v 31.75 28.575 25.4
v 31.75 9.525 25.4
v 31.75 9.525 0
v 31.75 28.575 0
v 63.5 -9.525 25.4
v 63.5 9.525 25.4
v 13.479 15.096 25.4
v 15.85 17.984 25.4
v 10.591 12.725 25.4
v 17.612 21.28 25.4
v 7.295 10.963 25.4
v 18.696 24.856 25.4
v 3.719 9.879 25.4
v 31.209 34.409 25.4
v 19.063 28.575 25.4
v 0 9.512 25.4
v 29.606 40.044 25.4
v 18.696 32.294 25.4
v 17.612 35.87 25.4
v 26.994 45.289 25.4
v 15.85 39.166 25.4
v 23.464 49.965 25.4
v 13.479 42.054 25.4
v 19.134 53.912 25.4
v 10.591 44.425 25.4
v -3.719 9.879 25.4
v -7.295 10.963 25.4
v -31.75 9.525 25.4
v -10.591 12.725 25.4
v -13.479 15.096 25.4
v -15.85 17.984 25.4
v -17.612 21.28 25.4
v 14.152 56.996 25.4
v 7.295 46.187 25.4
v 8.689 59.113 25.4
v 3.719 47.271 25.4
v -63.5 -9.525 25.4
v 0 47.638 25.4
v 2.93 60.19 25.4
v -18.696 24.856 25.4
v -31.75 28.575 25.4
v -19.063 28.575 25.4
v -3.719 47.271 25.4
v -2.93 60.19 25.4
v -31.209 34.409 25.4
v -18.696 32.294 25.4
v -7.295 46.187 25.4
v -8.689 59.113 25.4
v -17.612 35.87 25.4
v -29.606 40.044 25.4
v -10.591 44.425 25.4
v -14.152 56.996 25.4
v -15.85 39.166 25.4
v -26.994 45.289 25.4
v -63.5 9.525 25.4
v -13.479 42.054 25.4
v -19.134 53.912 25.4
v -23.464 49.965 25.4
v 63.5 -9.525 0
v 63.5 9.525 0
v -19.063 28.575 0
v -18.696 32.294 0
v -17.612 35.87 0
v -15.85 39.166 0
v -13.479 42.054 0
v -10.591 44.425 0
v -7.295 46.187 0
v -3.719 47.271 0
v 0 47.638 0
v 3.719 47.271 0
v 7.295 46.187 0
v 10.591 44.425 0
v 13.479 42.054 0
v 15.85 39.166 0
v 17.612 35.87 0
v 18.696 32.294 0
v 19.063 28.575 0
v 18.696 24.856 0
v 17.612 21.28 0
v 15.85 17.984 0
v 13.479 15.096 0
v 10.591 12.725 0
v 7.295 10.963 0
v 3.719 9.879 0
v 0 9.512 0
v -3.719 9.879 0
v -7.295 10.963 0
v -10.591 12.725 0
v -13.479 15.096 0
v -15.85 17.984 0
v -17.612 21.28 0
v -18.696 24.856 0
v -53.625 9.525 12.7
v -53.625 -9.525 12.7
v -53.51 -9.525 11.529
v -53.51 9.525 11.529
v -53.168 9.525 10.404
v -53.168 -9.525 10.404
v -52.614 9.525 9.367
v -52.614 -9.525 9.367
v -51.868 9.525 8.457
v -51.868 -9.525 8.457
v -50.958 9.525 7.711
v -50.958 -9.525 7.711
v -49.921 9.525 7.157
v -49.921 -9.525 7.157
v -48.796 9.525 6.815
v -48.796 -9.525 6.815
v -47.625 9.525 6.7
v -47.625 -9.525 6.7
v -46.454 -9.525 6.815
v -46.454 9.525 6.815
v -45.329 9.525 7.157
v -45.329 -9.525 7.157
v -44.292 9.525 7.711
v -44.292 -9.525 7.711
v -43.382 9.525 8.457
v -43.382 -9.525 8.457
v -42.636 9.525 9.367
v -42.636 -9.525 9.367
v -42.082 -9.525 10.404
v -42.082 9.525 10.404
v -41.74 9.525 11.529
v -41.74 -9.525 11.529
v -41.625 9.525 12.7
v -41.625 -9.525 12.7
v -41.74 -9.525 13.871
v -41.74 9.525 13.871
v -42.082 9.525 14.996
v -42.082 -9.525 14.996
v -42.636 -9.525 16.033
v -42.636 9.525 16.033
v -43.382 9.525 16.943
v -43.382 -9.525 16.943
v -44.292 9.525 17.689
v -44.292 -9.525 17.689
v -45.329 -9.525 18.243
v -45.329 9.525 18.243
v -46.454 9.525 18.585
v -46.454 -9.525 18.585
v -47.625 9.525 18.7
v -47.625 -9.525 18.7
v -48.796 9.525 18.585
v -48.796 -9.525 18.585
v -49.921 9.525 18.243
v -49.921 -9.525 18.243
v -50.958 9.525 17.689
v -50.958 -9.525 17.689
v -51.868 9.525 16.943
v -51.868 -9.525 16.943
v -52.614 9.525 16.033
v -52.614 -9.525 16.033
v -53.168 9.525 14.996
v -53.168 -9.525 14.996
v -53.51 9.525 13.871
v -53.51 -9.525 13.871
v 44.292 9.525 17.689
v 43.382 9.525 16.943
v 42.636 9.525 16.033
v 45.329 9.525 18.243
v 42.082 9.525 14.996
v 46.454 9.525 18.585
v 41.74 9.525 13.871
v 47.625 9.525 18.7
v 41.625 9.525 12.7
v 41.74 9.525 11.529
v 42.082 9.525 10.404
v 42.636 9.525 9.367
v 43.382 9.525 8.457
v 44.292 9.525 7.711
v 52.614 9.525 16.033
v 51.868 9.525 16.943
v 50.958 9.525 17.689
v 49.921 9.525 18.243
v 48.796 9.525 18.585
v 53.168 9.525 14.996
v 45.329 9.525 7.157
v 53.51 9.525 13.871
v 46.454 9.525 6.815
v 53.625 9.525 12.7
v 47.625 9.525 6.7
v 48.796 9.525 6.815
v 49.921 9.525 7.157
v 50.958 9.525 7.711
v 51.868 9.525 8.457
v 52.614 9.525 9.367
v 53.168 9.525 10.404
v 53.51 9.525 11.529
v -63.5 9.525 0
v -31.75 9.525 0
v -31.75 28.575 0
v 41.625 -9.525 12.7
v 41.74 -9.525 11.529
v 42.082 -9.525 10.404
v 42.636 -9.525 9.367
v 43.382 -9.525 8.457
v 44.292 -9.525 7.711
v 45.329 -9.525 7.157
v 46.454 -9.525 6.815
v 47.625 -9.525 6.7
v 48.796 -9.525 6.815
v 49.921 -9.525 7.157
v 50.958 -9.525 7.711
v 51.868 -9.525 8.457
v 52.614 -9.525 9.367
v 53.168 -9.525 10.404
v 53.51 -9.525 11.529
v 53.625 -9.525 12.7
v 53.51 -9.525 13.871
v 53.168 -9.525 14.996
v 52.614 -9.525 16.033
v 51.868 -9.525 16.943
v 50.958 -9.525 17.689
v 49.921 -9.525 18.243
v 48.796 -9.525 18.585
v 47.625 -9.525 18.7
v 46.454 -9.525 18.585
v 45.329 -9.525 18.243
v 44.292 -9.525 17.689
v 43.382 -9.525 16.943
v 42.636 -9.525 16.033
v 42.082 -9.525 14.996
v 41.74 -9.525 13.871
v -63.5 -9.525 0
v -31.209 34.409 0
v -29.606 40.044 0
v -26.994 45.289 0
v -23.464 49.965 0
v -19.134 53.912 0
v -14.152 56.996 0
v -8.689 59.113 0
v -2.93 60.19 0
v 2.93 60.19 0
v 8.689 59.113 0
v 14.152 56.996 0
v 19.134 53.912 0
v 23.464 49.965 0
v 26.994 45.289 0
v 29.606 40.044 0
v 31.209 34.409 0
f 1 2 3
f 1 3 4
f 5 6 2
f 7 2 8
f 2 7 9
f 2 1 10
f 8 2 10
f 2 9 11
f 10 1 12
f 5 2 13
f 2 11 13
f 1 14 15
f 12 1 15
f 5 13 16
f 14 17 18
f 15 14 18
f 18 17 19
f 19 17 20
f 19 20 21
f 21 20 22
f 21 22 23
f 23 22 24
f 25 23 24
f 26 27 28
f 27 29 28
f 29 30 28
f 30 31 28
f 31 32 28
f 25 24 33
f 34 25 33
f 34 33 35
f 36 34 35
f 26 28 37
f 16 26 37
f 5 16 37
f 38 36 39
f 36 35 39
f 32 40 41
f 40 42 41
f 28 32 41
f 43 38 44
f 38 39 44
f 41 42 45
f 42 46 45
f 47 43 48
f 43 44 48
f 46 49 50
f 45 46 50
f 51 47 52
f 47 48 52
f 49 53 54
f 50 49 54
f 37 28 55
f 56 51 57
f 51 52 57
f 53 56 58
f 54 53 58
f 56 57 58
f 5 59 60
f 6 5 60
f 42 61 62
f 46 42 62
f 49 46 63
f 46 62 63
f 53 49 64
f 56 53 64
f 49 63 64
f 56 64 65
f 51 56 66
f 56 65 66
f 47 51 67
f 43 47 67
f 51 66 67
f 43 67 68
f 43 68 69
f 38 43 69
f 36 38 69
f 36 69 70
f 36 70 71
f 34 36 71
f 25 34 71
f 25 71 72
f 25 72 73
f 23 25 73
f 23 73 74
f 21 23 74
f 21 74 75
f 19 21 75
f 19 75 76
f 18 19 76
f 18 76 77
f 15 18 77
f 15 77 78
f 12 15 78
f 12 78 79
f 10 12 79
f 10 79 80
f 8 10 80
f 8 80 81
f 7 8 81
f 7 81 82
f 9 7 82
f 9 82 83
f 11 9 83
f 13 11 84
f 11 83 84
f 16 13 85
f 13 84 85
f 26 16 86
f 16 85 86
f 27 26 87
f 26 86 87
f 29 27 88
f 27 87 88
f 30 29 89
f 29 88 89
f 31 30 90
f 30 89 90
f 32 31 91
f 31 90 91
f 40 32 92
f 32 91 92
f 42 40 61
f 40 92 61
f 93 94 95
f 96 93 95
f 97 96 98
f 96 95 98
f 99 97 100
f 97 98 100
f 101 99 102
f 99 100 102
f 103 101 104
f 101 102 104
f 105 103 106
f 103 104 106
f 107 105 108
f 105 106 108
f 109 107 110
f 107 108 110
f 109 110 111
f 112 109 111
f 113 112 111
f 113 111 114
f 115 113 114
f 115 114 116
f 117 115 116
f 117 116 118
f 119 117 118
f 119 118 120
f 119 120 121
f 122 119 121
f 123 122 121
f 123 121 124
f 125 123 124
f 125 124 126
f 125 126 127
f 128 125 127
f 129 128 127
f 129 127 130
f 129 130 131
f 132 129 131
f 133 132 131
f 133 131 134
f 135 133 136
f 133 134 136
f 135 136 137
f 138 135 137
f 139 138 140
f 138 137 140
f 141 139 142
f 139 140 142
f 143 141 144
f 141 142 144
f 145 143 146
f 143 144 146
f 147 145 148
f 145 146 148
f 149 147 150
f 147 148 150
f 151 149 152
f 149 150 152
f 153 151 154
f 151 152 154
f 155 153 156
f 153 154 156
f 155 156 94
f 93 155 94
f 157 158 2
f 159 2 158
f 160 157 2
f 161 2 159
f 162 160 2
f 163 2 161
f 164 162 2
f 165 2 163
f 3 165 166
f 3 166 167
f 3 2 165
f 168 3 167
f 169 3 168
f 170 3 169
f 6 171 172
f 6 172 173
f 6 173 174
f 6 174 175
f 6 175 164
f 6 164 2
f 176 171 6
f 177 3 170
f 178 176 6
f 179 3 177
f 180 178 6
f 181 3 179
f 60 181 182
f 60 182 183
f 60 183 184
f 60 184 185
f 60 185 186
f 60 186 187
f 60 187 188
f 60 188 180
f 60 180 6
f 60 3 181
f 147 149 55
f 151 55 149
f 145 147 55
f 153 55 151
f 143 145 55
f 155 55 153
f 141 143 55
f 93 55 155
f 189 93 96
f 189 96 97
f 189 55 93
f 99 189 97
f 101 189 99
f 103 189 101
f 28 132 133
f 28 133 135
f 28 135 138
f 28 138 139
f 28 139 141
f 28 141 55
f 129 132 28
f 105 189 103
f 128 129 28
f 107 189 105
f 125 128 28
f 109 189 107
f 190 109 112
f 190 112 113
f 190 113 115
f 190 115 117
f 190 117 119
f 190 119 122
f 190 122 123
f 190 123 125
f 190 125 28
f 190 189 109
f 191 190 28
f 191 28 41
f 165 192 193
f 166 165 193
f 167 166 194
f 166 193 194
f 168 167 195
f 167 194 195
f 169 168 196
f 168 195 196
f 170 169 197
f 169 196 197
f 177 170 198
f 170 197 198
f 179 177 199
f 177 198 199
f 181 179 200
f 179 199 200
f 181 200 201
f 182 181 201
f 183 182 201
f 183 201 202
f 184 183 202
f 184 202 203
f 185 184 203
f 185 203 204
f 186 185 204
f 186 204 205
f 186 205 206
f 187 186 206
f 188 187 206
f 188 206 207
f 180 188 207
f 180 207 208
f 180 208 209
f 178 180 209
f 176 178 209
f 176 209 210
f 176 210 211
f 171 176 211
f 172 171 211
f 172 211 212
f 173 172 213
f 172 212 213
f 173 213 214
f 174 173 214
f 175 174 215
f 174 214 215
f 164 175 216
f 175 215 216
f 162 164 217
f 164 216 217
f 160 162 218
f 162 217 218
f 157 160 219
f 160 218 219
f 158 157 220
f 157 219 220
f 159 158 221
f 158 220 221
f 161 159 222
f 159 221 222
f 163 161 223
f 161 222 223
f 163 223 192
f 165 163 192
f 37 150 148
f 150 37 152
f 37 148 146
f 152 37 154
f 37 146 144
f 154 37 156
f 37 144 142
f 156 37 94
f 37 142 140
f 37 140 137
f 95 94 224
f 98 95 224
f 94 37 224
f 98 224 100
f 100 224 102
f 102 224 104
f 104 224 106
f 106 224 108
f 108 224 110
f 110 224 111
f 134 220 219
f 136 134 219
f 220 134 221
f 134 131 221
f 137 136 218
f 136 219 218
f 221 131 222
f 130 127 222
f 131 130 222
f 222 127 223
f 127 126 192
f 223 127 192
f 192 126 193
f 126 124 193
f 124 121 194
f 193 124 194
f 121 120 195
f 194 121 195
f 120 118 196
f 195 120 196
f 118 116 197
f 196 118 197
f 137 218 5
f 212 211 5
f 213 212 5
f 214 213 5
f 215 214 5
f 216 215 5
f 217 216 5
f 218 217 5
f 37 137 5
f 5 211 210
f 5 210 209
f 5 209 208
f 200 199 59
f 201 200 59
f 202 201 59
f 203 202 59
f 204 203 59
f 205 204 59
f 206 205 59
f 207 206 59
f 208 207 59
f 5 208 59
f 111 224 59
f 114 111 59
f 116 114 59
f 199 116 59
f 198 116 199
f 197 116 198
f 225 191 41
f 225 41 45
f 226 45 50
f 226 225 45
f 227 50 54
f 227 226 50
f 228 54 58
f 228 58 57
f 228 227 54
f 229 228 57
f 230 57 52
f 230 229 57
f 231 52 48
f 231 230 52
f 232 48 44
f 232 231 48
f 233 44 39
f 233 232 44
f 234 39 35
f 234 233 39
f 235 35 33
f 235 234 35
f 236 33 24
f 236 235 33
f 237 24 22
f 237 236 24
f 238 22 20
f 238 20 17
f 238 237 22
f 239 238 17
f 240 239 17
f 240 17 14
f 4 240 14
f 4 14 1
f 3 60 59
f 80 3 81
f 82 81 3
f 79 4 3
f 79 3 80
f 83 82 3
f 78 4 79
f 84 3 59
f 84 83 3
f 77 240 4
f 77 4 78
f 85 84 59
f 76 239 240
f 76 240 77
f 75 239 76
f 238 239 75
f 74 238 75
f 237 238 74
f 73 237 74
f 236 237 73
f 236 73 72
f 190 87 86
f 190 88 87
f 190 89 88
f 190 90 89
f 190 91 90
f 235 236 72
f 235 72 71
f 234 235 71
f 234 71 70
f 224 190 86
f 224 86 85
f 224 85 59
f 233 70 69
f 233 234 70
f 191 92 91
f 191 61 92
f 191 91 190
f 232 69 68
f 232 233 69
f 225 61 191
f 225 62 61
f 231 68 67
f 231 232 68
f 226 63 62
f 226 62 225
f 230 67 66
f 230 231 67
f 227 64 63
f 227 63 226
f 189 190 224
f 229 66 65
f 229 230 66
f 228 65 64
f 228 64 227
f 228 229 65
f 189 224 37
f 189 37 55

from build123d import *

# Parameters (mm, degrees)
SKETCH1_W                  = 63.5
SKETCH1_H                  = 19.05
SKETCH1_W_2                = 127
BOSS_EXTRUDE1_DEPTH        = 25.4
SKETCH5_R                  = 19.0627
CUT_EXTRUDE1_DEPTH         = 26.4
F_12_0_12_DIAMETER_HOLE1_D = 12


with BuildPart() as part:
    # Sketch1 → Boss-Extrude1 (new body)
    with BuildSketch(Plane.XY):
        with BuildLine():
            ThreePointArc((-31.75, 28.575), (0, 60.325), (31.75, 28.575))
            Line((31.75, 28.575), (-31.75, 28.575))
        make_face()
        with Locations((0, 19.05)):
            Rectangle(SKETCH1_W, SKETCH1_H)
        Rectangle(SKETCH1_W_2, SKETCH1_H)
    extrude(amount=BOSS_EXTRUDE1_DEPTH)

    # Sketch5 → Cut-Extrude1 (cut, through all)
    with BuildSketch(Plane(origin=(0, 0, 0), x_dir=(-1, 0, 0), z_dir=(0, 0, -1))):
        with Locations((0, 28.575)):
            Circle(SKETCH5_R)
    extrude(amount=-CUT_EXTRUDE1_DEPTH, mode=Mode.SUBTRACT)

    # Ø12.0 (12) Diameter Hole1 (through all)
    with Locations(Plane(origin=(0, 9.525, 0), x_dir=(1, 0, 0), z_dir=(0, 1, 0))):
        with Locations((-47.625, -12.7), (47.625, -12.7)):
            Hole(F_12_0_12_DIAMETER_HOLE1_D / 2)


solid = part.part
